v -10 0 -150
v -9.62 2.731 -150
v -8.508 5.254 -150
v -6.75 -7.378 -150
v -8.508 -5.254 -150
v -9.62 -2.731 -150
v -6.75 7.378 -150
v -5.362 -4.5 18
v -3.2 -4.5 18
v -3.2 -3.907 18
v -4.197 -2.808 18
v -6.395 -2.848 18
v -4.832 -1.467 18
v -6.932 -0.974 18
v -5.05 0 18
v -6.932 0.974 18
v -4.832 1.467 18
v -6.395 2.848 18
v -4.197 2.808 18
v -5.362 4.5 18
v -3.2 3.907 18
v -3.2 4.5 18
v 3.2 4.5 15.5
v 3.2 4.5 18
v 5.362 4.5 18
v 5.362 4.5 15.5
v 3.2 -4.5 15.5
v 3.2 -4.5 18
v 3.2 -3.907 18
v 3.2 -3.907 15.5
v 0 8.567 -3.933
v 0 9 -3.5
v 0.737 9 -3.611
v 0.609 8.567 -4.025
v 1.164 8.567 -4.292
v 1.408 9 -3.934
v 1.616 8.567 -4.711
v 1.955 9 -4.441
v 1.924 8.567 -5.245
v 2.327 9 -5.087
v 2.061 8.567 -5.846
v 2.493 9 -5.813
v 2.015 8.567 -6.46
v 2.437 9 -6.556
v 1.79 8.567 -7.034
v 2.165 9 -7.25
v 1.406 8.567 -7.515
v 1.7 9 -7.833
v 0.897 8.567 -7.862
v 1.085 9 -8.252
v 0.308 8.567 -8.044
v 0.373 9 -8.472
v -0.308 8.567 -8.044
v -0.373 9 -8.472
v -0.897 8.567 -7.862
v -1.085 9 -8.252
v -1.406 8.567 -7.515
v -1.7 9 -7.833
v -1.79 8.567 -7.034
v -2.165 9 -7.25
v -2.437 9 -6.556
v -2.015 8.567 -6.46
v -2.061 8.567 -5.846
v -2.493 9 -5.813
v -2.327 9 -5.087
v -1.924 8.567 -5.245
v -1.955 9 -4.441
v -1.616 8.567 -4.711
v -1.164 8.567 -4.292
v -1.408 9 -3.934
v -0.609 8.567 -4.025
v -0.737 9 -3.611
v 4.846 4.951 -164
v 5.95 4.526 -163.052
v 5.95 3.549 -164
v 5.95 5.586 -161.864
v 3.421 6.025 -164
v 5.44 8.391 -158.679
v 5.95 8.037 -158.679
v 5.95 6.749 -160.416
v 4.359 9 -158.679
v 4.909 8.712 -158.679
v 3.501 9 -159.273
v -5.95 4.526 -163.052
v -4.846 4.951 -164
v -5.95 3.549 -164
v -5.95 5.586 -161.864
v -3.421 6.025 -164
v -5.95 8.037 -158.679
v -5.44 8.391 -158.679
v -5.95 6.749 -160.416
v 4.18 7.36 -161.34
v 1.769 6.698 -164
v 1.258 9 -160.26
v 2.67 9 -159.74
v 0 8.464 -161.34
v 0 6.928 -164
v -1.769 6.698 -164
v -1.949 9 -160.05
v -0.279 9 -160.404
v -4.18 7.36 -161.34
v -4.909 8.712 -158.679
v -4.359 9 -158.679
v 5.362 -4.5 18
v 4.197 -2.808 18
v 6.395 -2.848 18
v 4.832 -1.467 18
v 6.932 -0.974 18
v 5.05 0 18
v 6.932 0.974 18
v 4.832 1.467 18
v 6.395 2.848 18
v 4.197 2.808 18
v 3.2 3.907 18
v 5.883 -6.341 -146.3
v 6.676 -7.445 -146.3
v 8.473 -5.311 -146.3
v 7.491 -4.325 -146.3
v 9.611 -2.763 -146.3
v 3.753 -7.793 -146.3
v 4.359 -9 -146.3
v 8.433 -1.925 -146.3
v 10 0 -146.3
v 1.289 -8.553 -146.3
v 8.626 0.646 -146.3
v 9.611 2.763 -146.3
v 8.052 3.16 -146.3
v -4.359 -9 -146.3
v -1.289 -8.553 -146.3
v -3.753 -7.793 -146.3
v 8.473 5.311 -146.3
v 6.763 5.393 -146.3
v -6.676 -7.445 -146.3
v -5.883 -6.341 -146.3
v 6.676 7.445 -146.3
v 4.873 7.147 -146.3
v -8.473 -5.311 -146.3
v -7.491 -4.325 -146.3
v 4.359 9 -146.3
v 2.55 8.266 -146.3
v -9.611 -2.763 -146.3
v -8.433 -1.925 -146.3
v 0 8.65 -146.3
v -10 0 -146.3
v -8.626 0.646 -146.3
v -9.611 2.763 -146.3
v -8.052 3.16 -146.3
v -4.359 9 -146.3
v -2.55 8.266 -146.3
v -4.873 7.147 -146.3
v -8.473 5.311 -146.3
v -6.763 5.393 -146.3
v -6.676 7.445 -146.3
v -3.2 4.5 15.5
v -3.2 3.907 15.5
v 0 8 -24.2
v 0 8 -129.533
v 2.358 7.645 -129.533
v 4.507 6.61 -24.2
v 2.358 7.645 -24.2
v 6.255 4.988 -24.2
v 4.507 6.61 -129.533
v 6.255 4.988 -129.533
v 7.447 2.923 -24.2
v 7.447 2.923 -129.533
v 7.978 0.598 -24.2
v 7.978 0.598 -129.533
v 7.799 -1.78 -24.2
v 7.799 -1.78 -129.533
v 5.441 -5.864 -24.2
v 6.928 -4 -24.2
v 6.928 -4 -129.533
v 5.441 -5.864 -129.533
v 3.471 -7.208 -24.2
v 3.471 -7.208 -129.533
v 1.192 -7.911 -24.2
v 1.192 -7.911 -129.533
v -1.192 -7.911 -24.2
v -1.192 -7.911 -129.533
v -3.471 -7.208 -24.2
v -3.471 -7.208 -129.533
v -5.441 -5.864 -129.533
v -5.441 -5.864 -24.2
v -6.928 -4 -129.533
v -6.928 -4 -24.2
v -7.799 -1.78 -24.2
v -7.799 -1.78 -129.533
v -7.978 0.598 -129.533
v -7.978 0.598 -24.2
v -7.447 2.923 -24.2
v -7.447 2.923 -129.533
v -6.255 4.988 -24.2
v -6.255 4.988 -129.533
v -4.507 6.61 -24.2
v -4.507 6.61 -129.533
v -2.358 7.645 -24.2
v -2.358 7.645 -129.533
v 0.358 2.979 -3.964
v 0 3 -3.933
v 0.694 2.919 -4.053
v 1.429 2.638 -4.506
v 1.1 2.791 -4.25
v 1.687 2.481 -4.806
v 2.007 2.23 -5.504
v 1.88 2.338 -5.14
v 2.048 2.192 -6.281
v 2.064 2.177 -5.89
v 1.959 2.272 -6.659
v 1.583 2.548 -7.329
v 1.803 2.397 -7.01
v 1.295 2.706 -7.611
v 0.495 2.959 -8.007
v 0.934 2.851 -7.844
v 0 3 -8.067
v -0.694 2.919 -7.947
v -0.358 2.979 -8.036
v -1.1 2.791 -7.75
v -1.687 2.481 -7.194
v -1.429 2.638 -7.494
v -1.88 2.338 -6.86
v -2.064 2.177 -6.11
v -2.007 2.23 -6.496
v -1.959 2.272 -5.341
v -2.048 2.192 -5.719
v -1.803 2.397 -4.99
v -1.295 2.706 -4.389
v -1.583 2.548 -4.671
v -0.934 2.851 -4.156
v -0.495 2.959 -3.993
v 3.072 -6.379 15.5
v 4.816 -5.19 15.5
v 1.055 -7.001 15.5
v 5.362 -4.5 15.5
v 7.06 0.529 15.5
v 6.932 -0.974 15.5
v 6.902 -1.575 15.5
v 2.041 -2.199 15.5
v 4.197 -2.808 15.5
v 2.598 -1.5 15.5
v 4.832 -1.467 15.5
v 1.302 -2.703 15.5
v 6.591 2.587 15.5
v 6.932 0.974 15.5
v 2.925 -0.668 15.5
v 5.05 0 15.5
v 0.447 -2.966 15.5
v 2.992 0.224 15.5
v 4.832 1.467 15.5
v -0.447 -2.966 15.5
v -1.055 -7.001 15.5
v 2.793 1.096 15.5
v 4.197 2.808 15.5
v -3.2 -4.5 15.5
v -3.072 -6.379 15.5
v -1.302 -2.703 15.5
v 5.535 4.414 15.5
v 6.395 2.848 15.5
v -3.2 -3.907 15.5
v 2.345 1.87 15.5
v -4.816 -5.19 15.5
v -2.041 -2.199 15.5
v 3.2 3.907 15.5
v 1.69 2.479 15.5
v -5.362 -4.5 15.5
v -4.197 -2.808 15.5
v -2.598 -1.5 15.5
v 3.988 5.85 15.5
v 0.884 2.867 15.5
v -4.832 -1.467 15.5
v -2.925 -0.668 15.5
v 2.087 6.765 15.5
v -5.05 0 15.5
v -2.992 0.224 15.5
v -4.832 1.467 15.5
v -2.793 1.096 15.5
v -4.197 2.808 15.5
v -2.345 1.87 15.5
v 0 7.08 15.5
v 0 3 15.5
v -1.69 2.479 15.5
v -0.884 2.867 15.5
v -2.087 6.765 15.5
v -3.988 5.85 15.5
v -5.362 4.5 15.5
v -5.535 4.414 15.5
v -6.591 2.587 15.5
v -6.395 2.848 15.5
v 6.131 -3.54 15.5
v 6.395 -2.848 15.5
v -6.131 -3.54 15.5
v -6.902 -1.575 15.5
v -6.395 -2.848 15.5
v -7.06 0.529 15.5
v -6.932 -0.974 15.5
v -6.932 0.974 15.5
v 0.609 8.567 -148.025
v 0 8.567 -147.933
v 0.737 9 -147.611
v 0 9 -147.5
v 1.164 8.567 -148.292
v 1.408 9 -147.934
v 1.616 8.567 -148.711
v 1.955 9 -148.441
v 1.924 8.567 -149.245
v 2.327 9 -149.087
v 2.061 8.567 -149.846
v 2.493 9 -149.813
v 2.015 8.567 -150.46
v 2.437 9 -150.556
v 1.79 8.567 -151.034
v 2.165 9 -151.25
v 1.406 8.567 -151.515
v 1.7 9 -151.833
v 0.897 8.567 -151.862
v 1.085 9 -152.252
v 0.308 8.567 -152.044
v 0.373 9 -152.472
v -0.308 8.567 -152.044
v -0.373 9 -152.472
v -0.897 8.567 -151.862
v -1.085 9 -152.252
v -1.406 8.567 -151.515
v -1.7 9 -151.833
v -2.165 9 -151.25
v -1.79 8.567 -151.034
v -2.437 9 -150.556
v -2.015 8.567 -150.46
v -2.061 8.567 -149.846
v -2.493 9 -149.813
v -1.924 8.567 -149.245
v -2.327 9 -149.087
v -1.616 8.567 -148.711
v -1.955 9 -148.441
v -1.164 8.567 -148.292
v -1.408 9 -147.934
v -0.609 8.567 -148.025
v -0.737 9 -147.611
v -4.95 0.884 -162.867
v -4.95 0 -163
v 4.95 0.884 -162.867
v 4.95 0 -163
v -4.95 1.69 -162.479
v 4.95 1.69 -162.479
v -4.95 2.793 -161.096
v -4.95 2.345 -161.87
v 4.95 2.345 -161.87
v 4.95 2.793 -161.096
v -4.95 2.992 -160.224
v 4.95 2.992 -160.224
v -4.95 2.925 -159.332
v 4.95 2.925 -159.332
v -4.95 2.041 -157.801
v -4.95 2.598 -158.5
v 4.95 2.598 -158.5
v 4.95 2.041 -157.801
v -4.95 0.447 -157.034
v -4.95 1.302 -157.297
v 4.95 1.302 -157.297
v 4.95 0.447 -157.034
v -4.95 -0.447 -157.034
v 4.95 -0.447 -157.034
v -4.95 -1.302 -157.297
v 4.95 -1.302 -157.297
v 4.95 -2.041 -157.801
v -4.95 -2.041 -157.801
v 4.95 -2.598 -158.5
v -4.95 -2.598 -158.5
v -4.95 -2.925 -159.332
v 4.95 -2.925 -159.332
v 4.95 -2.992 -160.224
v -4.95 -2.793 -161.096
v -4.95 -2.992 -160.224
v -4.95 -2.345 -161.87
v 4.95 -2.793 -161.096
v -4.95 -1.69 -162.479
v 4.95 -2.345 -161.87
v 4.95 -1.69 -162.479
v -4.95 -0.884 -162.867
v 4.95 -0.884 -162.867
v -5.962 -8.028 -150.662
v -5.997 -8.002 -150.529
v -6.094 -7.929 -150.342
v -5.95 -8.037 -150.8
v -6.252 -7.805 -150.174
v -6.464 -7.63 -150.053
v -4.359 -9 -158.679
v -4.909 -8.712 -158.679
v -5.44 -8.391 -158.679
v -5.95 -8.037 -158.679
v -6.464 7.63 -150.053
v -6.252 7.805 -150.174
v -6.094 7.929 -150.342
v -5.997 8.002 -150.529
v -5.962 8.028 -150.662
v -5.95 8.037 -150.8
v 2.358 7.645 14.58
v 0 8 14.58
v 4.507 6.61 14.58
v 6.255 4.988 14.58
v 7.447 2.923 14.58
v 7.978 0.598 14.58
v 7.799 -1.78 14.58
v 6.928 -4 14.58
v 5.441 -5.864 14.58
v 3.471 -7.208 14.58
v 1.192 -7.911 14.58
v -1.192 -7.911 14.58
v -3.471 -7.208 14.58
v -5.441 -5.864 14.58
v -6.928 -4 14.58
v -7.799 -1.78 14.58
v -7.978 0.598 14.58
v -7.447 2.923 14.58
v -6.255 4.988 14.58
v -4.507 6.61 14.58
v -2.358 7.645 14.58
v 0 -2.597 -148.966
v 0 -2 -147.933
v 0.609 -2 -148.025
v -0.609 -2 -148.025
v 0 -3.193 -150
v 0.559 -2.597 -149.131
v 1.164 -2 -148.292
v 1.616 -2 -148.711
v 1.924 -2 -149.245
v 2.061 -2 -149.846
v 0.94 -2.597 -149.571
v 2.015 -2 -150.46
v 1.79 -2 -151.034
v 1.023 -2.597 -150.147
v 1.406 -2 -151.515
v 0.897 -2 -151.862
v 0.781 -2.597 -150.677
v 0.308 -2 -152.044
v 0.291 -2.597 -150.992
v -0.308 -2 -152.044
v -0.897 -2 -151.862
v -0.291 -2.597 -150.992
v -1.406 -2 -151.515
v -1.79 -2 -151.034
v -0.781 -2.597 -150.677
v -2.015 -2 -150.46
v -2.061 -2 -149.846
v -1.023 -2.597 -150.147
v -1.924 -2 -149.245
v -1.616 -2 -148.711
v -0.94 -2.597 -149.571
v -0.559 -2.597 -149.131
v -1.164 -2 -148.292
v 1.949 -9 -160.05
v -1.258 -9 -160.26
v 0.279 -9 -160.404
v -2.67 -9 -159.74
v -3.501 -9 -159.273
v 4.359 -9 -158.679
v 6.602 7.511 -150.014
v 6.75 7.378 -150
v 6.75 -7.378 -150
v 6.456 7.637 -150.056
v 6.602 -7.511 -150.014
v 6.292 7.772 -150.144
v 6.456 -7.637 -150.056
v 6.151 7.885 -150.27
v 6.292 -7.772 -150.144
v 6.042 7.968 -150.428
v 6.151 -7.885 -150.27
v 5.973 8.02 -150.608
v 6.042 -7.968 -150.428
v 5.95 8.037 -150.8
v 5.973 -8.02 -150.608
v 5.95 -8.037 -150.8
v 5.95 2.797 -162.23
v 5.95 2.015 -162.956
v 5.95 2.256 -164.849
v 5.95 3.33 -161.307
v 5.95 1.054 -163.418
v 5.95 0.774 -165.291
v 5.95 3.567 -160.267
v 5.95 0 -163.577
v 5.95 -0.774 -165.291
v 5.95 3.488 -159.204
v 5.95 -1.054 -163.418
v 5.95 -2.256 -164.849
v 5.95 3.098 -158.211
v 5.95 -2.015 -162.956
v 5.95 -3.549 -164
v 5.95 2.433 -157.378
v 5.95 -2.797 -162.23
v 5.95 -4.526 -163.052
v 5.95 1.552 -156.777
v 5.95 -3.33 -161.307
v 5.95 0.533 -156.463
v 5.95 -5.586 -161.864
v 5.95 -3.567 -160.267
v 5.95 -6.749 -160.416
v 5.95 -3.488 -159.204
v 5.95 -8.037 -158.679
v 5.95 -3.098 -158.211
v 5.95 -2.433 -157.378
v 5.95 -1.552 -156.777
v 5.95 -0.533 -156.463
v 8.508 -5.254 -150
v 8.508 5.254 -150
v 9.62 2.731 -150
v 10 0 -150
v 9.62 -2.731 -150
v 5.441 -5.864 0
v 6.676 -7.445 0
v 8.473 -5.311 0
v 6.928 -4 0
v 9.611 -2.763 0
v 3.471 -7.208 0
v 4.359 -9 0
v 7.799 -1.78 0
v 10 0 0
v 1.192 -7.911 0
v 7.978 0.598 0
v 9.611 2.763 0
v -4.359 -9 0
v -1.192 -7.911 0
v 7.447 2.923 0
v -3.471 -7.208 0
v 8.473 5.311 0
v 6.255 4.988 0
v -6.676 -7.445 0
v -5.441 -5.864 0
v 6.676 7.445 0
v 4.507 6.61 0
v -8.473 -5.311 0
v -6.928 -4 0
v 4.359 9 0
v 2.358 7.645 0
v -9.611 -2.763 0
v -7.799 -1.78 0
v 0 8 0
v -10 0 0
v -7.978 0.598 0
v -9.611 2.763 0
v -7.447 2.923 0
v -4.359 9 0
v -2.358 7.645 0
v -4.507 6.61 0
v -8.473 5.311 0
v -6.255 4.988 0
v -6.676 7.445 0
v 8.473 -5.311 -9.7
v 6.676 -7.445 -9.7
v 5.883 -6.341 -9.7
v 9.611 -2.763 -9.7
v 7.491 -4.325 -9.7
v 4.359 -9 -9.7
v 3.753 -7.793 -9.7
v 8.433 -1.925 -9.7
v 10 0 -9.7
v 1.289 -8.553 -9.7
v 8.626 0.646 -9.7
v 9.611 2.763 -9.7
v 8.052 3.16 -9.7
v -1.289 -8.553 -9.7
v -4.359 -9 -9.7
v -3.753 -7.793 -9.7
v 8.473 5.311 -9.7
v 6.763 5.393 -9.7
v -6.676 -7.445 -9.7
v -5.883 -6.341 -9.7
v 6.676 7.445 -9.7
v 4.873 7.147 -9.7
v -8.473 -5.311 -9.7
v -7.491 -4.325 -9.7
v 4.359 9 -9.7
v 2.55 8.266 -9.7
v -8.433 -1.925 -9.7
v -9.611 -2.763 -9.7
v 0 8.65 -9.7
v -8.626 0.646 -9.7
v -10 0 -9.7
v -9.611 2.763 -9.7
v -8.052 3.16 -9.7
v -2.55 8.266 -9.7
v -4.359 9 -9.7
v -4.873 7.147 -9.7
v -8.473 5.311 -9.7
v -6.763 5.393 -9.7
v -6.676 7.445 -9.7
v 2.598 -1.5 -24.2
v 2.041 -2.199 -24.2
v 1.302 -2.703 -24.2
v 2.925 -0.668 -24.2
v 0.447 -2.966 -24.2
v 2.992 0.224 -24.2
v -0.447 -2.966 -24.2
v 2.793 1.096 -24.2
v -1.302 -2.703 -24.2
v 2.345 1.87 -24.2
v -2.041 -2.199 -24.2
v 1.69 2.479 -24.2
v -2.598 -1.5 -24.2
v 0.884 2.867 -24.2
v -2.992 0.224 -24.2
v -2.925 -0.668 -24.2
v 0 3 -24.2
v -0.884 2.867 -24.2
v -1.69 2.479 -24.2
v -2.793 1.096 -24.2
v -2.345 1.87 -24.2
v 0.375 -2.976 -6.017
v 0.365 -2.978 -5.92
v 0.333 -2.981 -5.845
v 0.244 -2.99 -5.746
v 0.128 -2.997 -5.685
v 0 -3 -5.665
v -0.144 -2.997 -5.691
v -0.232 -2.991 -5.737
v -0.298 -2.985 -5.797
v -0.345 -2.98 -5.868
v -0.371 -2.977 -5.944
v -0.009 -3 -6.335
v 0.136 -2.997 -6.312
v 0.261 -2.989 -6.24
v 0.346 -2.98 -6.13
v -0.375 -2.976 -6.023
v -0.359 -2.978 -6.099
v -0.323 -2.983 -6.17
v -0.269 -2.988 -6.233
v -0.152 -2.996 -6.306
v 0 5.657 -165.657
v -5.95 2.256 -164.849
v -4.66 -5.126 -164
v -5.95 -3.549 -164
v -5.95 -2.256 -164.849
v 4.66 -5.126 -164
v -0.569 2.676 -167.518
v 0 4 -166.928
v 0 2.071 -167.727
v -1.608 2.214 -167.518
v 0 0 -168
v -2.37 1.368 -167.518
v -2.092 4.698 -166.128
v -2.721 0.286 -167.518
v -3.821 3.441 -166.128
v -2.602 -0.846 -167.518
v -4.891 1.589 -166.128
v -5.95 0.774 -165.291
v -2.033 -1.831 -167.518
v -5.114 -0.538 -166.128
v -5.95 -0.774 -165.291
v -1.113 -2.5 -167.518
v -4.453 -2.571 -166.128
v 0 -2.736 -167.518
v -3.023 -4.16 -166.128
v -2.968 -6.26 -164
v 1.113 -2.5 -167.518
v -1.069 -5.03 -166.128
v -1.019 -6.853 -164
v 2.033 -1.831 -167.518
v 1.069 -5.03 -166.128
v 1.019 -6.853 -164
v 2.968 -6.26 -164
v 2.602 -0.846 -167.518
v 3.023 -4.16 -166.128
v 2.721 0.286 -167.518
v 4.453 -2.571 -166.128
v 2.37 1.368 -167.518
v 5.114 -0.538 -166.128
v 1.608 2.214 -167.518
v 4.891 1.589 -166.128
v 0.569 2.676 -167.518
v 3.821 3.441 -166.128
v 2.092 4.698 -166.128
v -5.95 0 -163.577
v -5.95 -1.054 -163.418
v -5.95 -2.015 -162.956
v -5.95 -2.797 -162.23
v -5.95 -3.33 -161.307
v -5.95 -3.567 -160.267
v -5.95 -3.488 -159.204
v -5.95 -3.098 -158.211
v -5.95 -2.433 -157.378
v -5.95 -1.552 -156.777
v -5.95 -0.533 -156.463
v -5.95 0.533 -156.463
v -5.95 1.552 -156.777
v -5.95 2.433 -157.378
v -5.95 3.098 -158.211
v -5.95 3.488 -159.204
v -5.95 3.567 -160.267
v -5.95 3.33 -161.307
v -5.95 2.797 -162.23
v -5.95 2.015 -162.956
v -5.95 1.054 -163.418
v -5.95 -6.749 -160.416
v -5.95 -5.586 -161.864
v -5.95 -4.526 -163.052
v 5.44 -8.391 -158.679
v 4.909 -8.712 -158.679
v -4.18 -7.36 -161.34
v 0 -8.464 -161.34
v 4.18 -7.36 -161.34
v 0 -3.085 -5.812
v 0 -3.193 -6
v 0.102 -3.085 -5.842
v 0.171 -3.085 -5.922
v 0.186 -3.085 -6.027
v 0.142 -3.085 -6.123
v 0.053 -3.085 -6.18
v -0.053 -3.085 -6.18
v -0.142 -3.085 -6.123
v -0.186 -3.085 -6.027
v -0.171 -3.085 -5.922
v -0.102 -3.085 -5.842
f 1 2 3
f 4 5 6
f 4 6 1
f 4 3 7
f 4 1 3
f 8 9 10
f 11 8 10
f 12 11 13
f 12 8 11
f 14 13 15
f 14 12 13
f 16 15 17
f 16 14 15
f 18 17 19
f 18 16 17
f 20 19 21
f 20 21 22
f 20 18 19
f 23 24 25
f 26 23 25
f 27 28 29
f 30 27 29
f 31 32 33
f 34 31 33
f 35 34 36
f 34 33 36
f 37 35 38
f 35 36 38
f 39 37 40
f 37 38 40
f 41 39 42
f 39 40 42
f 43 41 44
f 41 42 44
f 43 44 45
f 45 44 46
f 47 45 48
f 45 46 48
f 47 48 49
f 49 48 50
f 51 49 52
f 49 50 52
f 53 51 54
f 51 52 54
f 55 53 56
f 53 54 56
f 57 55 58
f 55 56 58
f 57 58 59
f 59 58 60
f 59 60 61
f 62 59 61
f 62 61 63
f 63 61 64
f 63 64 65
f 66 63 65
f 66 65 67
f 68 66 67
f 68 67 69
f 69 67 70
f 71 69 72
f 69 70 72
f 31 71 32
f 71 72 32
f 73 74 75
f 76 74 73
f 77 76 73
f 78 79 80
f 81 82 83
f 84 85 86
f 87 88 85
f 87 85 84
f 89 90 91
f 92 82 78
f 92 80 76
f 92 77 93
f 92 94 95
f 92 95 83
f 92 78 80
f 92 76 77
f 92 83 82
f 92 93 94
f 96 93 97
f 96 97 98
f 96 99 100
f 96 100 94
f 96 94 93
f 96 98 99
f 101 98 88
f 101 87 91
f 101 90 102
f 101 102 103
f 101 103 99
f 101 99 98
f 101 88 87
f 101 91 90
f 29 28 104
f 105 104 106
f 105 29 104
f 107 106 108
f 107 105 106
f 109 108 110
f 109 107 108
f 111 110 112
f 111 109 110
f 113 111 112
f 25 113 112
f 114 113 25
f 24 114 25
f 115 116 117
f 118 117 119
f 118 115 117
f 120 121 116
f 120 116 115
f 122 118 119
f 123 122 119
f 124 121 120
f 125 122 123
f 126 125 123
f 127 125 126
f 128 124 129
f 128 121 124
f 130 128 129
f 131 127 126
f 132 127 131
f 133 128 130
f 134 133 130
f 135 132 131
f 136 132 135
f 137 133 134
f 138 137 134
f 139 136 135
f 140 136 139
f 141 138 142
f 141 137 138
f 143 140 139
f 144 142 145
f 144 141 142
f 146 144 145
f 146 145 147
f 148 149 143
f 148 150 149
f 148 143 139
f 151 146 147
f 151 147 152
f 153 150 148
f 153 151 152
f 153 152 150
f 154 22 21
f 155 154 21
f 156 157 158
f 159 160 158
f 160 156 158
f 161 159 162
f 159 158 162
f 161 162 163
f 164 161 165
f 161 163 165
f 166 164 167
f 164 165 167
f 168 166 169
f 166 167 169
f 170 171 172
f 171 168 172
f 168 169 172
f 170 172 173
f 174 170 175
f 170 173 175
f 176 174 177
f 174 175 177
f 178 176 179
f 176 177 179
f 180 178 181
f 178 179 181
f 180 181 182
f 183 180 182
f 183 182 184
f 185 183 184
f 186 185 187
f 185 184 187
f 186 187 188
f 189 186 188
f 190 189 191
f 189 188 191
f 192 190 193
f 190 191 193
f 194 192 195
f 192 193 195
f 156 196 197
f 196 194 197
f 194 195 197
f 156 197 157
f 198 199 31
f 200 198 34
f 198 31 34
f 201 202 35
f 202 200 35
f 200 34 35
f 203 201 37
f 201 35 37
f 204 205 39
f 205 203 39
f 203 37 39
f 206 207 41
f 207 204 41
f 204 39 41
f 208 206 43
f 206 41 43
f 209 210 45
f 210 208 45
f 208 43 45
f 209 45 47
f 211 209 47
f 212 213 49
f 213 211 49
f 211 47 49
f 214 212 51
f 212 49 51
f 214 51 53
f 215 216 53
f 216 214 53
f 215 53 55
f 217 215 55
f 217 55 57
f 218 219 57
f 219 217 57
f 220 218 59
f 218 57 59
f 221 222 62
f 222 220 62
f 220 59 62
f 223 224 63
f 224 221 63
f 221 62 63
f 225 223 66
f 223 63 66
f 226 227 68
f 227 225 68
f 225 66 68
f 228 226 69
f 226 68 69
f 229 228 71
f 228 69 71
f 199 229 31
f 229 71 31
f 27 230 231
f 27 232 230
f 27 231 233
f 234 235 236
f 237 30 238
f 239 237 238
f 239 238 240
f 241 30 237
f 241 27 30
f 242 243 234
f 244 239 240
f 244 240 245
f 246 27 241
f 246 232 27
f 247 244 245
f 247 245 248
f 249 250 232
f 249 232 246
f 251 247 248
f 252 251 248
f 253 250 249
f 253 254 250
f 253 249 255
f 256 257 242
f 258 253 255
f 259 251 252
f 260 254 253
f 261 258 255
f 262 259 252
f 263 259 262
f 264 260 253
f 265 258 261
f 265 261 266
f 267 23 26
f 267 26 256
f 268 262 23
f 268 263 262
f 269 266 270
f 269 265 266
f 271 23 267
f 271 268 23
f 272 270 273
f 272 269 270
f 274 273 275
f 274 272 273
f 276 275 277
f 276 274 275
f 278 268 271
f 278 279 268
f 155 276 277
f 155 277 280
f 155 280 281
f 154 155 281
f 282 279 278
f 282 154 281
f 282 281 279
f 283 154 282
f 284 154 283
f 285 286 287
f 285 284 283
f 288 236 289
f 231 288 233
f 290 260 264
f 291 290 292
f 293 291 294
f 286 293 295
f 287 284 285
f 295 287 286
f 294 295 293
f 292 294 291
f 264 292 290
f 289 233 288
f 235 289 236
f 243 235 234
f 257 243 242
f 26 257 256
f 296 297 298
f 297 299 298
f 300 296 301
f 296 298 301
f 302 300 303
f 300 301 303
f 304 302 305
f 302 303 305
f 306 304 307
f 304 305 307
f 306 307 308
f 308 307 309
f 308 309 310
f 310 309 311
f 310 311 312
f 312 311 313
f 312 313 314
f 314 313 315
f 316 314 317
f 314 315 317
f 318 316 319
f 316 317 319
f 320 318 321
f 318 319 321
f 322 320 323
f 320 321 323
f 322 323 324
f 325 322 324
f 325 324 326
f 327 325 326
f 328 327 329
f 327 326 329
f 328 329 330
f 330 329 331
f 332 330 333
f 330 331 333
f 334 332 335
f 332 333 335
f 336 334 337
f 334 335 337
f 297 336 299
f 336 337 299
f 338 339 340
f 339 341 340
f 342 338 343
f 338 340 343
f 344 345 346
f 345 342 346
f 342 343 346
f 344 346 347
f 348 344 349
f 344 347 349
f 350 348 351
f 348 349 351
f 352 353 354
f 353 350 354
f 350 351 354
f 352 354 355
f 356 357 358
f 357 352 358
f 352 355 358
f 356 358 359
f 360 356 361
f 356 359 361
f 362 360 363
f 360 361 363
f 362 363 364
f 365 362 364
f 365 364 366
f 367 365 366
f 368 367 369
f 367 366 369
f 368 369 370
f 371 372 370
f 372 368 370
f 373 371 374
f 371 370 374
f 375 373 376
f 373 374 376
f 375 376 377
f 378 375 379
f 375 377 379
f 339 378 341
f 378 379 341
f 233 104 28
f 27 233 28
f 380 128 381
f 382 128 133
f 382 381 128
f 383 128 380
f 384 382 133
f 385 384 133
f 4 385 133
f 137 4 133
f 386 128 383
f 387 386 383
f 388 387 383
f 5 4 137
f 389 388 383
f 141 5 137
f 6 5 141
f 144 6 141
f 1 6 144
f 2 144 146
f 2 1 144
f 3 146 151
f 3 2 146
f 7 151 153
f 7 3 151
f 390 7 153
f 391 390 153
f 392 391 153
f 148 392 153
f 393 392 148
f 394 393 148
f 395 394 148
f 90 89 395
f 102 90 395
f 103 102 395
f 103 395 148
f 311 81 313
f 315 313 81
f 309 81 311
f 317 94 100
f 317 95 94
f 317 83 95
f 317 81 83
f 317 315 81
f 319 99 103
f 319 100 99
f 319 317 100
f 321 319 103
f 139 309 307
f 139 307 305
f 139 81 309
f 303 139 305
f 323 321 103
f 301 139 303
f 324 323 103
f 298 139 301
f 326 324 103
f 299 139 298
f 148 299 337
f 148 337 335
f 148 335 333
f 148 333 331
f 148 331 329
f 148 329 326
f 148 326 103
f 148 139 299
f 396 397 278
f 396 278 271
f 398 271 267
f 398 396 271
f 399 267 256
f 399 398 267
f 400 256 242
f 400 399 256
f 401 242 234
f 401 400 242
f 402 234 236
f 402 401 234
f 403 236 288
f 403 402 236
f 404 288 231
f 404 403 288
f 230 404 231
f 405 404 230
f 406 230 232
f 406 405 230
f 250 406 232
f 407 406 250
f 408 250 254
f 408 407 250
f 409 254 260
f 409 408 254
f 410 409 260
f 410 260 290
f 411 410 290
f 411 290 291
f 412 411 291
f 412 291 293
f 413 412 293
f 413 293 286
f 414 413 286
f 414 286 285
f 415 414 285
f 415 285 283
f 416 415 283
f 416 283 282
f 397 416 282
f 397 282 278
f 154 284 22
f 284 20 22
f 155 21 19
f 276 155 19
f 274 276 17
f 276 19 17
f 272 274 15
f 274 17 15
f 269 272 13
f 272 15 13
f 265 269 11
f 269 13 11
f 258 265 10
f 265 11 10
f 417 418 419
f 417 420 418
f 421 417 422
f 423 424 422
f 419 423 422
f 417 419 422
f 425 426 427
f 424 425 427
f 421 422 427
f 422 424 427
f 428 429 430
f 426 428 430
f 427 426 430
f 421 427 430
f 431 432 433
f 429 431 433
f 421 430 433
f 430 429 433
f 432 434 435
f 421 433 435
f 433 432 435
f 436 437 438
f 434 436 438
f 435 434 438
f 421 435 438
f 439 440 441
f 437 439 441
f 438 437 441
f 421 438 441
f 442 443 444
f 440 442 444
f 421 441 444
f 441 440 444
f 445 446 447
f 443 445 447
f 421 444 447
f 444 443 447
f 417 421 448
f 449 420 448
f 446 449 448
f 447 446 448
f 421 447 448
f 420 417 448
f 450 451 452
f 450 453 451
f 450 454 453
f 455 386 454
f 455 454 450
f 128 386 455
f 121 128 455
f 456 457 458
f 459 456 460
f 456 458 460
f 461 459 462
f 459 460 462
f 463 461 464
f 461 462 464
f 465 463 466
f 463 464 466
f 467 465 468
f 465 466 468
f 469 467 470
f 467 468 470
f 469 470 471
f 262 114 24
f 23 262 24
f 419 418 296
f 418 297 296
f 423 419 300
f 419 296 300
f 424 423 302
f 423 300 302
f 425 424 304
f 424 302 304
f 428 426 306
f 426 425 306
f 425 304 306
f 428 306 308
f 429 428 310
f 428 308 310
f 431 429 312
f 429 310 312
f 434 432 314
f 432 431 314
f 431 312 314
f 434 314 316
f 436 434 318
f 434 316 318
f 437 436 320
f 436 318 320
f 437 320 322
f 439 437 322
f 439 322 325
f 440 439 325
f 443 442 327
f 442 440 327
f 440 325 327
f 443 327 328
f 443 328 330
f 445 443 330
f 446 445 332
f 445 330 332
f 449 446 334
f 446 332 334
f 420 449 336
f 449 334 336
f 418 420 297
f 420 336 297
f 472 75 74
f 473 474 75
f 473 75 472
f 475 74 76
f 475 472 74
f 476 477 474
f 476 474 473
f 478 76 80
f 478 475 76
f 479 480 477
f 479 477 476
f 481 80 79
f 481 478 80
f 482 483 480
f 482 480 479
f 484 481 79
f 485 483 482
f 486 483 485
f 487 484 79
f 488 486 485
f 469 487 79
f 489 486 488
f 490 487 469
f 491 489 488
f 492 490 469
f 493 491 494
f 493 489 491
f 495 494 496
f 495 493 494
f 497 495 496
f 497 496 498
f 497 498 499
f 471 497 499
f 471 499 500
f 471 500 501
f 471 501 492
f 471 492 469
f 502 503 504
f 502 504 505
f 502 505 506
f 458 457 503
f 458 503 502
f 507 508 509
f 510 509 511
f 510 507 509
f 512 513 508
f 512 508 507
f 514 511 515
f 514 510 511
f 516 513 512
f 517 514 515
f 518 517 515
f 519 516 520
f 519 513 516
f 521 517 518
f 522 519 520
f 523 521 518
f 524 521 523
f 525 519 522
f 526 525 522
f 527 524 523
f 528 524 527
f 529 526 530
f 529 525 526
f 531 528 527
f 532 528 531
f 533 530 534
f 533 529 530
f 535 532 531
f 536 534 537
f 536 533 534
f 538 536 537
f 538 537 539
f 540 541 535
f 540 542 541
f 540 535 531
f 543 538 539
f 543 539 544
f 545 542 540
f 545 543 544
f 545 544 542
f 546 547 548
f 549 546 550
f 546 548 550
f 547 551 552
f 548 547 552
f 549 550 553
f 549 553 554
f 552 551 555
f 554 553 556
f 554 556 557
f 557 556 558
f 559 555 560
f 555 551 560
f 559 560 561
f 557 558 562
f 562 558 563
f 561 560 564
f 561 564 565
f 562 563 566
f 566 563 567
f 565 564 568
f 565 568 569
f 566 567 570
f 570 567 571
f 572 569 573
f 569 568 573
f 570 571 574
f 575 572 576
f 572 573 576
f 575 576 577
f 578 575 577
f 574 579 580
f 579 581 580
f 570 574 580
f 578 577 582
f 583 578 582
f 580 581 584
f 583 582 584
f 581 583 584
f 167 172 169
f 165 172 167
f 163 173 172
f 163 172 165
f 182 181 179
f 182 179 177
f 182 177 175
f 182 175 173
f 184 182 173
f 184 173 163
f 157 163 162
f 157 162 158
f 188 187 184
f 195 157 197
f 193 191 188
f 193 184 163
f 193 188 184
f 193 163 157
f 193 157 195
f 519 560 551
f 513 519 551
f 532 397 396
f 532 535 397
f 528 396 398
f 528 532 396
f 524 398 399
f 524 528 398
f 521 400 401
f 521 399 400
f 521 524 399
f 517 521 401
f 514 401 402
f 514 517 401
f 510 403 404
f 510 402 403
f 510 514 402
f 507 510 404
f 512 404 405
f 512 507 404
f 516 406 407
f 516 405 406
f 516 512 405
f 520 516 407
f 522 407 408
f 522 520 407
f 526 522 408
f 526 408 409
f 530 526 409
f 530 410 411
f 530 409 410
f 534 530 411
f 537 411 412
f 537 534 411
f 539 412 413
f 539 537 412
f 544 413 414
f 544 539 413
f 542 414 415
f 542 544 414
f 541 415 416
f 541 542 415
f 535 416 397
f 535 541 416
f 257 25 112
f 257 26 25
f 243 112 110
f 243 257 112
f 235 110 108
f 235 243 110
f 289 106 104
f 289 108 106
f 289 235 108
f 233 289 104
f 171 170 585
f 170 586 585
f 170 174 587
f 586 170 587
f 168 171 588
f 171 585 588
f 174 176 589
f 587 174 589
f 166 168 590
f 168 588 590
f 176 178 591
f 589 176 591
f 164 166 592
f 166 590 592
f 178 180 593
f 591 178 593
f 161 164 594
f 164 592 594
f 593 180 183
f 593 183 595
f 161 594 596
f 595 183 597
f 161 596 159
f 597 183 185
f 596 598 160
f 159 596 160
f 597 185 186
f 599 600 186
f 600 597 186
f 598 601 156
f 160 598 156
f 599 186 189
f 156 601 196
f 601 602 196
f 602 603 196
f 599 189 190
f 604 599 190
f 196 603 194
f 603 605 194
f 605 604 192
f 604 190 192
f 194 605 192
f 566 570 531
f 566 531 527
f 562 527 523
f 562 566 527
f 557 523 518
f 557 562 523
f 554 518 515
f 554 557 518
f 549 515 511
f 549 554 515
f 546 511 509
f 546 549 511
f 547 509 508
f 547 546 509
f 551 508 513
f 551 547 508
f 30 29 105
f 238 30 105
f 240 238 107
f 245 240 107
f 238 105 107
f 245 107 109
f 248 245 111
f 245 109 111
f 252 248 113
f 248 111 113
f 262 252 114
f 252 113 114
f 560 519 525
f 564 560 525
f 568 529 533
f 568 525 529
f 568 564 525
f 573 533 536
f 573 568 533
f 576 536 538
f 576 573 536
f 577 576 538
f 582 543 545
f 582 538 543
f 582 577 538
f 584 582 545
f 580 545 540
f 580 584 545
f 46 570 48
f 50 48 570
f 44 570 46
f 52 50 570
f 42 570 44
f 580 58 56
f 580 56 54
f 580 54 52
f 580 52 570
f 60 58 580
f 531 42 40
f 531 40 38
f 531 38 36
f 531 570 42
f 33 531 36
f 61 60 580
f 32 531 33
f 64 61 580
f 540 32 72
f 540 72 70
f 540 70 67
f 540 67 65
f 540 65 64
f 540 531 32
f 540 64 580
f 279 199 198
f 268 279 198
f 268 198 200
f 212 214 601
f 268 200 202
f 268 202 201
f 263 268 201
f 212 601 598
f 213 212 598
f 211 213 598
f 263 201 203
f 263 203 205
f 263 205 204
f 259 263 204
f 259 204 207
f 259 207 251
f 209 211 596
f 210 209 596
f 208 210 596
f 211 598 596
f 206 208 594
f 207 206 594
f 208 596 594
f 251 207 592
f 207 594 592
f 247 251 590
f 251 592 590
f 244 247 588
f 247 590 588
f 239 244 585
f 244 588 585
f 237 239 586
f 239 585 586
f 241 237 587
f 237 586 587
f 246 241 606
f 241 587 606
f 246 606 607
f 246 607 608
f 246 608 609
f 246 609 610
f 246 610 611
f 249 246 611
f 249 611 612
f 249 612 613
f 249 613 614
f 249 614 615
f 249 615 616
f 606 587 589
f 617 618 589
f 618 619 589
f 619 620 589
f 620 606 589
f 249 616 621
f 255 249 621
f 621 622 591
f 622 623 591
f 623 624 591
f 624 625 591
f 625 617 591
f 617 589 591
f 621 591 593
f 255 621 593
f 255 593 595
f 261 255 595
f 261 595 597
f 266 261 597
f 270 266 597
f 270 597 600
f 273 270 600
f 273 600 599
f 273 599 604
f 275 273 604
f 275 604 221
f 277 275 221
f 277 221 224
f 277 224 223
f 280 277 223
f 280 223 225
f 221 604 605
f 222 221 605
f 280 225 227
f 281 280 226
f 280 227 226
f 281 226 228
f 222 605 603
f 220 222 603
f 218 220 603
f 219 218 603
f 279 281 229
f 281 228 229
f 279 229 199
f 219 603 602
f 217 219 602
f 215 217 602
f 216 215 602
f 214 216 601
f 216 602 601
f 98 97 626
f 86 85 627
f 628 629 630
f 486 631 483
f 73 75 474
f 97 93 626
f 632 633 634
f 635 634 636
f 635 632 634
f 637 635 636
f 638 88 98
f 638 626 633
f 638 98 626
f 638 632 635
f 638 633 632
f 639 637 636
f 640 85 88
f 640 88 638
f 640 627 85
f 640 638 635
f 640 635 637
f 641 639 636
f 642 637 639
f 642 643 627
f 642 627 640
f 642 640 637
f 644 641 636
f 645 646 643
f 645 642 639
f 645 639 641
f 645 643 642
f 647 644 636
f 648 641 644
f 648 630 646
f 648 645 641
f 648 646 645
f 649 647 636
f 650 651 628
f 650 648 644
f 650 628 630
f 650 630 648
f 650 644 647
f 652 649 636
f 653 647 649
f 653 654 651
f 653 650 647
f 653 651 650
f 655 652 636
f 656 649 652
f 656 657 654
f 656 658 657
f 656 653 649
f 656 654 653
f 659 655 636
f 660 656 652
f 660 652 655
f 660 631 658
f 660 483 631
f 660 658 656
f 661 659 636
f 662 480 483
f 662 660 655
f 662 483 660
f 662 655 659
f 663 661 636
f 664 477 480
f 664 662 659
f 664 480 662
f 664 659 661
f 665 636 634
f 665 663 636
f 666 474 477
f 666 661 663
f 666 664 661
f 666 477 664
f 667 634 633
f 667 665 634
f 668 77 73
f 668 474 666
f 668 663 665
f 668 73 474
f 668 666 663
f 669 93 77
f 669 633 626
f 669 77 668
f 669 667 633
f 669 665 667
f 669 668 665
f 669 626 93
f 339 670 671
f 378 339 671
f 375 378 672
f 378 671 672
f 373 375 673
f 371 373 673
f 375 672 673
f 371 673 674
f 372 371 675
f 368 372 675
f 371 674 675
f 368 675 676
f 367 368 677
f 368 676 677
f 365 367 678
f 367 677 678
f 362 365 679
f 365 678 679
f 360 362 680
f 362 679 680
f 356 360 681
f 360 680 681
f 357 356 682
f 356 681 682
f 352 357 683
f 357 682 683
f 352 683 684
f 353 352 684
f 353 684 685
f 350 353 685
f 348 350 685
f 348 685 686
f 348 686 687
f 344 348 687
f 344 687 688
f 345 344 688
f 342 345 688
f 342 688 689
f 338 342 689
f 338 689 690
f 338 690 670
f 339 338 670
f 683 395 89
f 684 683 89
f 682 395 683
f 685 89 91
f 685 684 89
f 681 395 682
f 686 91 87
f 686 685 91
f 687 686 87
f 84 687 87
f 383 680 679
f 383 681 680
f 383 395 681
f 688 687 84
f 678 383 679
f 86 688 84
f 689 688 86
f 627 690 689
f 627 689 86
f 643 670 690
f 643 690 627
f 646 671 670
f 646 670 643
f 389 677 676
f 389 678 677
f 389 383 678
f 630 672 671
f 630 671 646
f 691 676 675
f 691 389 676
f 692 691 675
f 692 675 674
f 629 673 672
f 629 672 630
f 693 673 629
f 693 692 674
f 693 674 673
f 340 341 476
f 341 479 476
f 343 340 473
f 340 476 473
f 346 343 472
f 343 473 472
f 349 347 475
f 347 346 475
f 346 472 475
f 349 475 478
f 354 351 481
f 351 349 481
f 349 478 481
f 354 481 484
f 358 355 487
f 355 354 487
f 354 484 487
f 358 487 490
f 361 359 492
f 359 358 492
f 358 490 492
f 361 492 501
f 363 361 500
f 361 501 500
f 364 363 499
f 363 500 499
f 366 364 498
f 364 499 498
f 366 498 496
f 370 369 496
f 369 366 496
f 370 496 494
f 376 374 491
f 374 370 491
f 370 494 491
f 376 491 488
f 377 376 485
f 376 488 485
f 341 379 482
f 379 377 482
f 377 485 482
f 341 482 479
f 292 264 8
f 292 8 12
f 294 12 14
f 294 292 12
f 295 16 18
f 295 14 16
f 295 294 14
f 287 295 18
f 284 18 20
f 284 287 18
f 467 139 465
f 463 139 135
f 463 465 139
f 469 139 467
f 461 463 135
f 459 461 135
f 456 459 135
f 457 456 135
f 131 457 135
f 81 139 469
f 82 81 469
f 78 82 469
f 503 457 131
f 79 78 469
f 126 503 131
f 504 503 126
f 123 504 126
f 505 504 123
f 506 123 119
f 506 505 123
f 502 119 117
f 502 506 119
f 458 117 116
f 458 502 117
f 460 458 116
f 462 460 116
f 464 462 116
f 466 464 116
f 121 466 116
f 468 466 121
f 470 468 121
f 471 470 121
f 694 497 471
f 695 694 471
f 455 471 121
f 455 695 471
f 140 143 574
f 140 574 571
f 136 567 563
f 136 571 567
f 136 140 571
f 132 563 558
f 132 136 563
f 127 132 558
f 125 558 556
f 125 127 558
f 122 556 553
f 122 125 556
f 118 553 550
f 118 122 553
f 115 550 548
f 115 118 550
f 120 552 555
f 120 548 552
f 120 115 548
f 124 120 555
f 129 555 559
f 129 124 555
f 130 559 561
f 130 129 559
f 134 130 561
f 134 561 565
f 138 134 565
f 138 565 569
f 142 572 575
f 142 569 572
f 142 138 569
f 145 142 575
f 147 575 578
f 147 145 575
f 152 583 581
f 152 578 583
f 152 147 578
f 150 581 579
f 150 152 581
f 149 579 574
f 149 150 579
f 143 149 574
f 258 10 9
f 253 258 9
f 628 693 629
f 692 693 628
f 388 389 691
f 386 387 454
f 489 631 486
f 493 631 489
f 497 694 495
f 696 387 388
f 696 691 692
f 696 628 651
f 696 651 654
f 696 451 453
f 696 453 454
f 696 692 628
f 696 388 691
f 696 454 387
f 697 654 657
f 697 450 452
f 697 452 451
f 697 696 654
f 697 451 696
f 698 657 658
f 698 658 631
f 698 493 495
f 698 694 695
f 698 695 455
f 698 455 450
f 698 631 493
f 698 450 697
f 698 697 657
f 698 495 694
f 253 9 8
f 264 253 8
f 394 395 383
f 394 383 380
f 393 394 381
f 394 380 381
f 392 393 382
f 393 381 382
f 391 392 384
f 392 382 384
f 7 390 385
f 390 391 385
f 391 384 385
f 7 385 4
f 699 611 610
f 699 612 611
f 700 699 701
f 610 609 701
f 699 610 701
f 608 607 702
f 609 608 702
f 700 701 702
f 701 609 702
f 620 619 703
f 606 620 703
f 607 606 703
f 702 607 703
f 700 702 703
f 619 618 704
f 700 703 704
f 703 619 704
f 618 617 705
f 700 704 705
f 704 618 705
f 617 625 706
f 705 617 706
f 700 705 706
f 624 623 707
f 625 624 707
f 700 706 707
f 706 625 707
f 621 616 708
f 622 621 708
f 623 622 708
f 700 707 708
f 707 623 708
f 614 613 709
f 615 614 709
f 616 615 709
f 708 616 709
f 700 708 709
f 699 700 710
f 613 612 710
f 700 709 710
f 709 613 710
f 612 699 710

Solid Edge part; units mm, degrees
sketch "Sketch1" plane through (0, 0, 0) normal (1, 0, 0) x (0, 1, 0)
  line L0 (0, 0) -> (10, 0)
  line L1 (10, 0) -> (10, -9.7)
  line L2 (10, -9.7) -> (8.65, -9.7)
  line L3 (8.65, -9.7) -> (8.65, -146.3)
  line L4 (8.65, -146.3) -> (10, -146.3)
  line L5 (10, -146.3) -> (10, -168)
  line L6 (10, -168) -> (0, -168)
  line L7 (0, -168) -> (0, 0)
revolve "RevolvedProtrusion1" add sketch "Sketch1" angle 360 about axis through (0, 0, -168) along (0, 0, 1)
sketch "Sketch2" plane through (0, 0, 0) normal (1, 0, 0) x (0, 1, 0)
  arc A0 (0, -168) -> (6.9282, -164) centre (0, -160) ccw
  line L0 (6.9282, -164) -> (13.8564, -152)
  line L1 (13.8564, -152) -> (17, -152)
  line L2 (17, -152) -> (17, -169)
  line L3 (17, -169) -> (0, -169)
  line L4 (0, -169) -> (0, -168)
revolve "RevolvedCutout1" cut sketch "Sketch2" angle 360 about axis through (0, 0, -169) along (0, 0, 1)
sketch "Sketch3" plane through (0, 0, 0) normal (0, -1, 0) x (1, 0, 0)
  line L0 (-20, -173) -> (-20, -150)
  line L1 (-20, -150) -> (-6.75, -150)
  arc A0 (-6.75, -150) -> (-5.95, -150.8) centre (-6.75, -150.8) cw
  line L2 (-5.95, -150.8) -> (-5.95, -171)
  line L3 (-5.95, -171) -> (5.95, -171)
  line L4 (5.95, -171) -> (5.95, -150.8)
  arc A1 (5.95, -150.8) -> (6.75, -150) centre (6.75, -150.8) cw
  line L5 (6.75, -150) -> (20, -150)
  line L6 (20, -150) -> (20, -173)
  line L7 (20, -173) -> (-20, -173)
extrude "ExtrudedCutout_1" cut sketch "Sketch3" against normal blind 10 and the other way blind 10
sketch "Sketch4" plane through (0, 0, 0) normal (0, 0, 1) x (1, 0, 0)
  line L0 (-12, -12) -> (12, -12)
  line L1 (12, -12) -> (12, 12)
  line L2 (12, 12) -> (-12, 12)
  line L3 (-12, 12) -> (-12, -12)
  line L4 (-11, -9) -> (11, -9)
  line L5 (11, -9) -> (11, 9)
  line L6 (11, 9) -> (-11, 9)
  line L7 (-11, 9) -> (-11, -9)
extrude "ExtrudedCutout_2" cut sketch "Sketch4" against normal blind 168
sketch "Sketch5" plane through (0, 0, 0) normal (0, -1, 0) x (1, 0, 0)
  line L0 (-5.95, -160) -> (-5.95, -163.5774)
  line L1 (-5.95, -163.5774) -> (-4.95, -163)
  line L2 (-4.95, -163) -> (4.95, -163)
  line L3 (4.95, -163) -> (5.95, -163.5774)
  line L4 (5.95, -163.5774) -> (5.95, -160)
  line L5 (5.95, -160) -> (-5.95, -160)
revolve "RevolvedCutout2" cut sketch "Sketch5" angle 360 about axis through (5.95, 0, -160) along (-1, 0, 0)
sketch "Sketch6" plane through (0, 0, 0) normal (1, 0, 0) x (0, 1, 0)
  line L0 (-3.1934, -150) -> (-2, -147.933)
  line L1 (-2, -147.933) -> (8.567, -147.933)
  line L2 (8.567, -147.933) -> (9, -147.5)
  line L3 (9, -147.5) -> (9, -150)
  line L4 (9, -150) -> (-3.1934, -150)
revolve "RevolvedCutout3" cut sketch "Sketch6" angle 360 about axis through (0, 9, -150) along (0, -1, 0)
sketch "Sketch7" plane through (0, 0, 0) normal (1, 0, 0) x (0, 1, 0)
  line L0 (-3.1934, -6) -> (-2, -3.933)
  line L1 (-2, -3.933) -> (8.567, -3.933)
  line L2 (8.567, -3.933) -> (9, -3.5)
  line L3 (9, -3.5) -> (9, -6)
  line L4 (9, -6) -> (-3.1934, -6)
revolve "RevolvedCutout4" cut sketch "Sketch7" angle 360 about axis through (0, 9, -6) along (0, -1, 0)
sketch "Sketch8" plane through (0, 0, 0) normal (1, 0, 0) x (0, 1, 0)
  line L0 (0, 18) -> (7, 18)
  line L1 (7, 18) -> (7, 15.5)
  line L2 (7, 15.5) -> (7.08, 15.5)
  line L3 (7.08, 15.5) -> (8, 14.58)
  line L4 (8, 14.58) -> (8, 0)
  line L5 (8, 0) -> (0, 0)
  line L6 (0, 0) -> (0, 18)
revolve "RevolvedProtrusion2" add sketch "Sketch8" angle 360 about axis through (0, 0, 0) along (0, 0, 1)
sketch "Sketch9" plane through (0, 0, 18) normal (0, 0, 1) x (1, 0, 0)
  line L0 (-10, -4.5) -> (-10, -10)
  line L1 (-10, -10) -> (10, -10)
  line L2 (10, -10) -> (10, -4.5)
  line L3 (10, -4.5) -> (3.2, -4.5)
  line L4 (3.2, -4.5) -> (3.2, -3.9067)
  arc A0 (3.2, -3.9067) -> (3.2, 3.9067) centre (0, 0) ccw
  line L5 (3.2, 3.9067) -> (3.2, 4.5)
  line L6 (3.2, 4.5) -> (10, 4.5)
  line L7 (10, 4.5) -> (10, 10)
  line L8 (10, 10) -> (-10, 10)
  line L9 (-10, 10) -> (-10, 4.5)
  line L10 (-10, 4.5) -> (-3.2, 4.5)
  line L11 (-3.2, 4.5) -> (-3.2, 3.9067)
  arc A1 (-3.2, 3.9067) -> (-3.2, -3.9067) centre (0, 0) ccw
  line L12 (-3.2, -3.9067) -> (-3.2, -4.5)
  line L13 (-3.2, -4.5) -> (-10, -4.5)
extrude "ExtrudedCutout_3" cut sketch "Sketch9" against normal blind 2.5
sketch "Sketch10" plane through (0, 0, 0) normal (1, 0, 0) x (0, 1, 0)
  line L0 (0, 18) -> (3, 18)
  line L1 (3, 18) -> (3, -24.2)
  line L2 (3, -24.2) -> (8, -24.2)
  line L3 (8, -24.2) -> (8, -129.5333)
  line L4 (8, -129.5333) -> (0, -129.5333)
  line L5 (0, -129.5333) -> (0, 18)
revolve "RevolvedCutout5" cut sketch "Sketch10" angle 360 about axis through (0, 0, -129.5333) along (0, 0, 1)
properties part number "BumbleB0480"
